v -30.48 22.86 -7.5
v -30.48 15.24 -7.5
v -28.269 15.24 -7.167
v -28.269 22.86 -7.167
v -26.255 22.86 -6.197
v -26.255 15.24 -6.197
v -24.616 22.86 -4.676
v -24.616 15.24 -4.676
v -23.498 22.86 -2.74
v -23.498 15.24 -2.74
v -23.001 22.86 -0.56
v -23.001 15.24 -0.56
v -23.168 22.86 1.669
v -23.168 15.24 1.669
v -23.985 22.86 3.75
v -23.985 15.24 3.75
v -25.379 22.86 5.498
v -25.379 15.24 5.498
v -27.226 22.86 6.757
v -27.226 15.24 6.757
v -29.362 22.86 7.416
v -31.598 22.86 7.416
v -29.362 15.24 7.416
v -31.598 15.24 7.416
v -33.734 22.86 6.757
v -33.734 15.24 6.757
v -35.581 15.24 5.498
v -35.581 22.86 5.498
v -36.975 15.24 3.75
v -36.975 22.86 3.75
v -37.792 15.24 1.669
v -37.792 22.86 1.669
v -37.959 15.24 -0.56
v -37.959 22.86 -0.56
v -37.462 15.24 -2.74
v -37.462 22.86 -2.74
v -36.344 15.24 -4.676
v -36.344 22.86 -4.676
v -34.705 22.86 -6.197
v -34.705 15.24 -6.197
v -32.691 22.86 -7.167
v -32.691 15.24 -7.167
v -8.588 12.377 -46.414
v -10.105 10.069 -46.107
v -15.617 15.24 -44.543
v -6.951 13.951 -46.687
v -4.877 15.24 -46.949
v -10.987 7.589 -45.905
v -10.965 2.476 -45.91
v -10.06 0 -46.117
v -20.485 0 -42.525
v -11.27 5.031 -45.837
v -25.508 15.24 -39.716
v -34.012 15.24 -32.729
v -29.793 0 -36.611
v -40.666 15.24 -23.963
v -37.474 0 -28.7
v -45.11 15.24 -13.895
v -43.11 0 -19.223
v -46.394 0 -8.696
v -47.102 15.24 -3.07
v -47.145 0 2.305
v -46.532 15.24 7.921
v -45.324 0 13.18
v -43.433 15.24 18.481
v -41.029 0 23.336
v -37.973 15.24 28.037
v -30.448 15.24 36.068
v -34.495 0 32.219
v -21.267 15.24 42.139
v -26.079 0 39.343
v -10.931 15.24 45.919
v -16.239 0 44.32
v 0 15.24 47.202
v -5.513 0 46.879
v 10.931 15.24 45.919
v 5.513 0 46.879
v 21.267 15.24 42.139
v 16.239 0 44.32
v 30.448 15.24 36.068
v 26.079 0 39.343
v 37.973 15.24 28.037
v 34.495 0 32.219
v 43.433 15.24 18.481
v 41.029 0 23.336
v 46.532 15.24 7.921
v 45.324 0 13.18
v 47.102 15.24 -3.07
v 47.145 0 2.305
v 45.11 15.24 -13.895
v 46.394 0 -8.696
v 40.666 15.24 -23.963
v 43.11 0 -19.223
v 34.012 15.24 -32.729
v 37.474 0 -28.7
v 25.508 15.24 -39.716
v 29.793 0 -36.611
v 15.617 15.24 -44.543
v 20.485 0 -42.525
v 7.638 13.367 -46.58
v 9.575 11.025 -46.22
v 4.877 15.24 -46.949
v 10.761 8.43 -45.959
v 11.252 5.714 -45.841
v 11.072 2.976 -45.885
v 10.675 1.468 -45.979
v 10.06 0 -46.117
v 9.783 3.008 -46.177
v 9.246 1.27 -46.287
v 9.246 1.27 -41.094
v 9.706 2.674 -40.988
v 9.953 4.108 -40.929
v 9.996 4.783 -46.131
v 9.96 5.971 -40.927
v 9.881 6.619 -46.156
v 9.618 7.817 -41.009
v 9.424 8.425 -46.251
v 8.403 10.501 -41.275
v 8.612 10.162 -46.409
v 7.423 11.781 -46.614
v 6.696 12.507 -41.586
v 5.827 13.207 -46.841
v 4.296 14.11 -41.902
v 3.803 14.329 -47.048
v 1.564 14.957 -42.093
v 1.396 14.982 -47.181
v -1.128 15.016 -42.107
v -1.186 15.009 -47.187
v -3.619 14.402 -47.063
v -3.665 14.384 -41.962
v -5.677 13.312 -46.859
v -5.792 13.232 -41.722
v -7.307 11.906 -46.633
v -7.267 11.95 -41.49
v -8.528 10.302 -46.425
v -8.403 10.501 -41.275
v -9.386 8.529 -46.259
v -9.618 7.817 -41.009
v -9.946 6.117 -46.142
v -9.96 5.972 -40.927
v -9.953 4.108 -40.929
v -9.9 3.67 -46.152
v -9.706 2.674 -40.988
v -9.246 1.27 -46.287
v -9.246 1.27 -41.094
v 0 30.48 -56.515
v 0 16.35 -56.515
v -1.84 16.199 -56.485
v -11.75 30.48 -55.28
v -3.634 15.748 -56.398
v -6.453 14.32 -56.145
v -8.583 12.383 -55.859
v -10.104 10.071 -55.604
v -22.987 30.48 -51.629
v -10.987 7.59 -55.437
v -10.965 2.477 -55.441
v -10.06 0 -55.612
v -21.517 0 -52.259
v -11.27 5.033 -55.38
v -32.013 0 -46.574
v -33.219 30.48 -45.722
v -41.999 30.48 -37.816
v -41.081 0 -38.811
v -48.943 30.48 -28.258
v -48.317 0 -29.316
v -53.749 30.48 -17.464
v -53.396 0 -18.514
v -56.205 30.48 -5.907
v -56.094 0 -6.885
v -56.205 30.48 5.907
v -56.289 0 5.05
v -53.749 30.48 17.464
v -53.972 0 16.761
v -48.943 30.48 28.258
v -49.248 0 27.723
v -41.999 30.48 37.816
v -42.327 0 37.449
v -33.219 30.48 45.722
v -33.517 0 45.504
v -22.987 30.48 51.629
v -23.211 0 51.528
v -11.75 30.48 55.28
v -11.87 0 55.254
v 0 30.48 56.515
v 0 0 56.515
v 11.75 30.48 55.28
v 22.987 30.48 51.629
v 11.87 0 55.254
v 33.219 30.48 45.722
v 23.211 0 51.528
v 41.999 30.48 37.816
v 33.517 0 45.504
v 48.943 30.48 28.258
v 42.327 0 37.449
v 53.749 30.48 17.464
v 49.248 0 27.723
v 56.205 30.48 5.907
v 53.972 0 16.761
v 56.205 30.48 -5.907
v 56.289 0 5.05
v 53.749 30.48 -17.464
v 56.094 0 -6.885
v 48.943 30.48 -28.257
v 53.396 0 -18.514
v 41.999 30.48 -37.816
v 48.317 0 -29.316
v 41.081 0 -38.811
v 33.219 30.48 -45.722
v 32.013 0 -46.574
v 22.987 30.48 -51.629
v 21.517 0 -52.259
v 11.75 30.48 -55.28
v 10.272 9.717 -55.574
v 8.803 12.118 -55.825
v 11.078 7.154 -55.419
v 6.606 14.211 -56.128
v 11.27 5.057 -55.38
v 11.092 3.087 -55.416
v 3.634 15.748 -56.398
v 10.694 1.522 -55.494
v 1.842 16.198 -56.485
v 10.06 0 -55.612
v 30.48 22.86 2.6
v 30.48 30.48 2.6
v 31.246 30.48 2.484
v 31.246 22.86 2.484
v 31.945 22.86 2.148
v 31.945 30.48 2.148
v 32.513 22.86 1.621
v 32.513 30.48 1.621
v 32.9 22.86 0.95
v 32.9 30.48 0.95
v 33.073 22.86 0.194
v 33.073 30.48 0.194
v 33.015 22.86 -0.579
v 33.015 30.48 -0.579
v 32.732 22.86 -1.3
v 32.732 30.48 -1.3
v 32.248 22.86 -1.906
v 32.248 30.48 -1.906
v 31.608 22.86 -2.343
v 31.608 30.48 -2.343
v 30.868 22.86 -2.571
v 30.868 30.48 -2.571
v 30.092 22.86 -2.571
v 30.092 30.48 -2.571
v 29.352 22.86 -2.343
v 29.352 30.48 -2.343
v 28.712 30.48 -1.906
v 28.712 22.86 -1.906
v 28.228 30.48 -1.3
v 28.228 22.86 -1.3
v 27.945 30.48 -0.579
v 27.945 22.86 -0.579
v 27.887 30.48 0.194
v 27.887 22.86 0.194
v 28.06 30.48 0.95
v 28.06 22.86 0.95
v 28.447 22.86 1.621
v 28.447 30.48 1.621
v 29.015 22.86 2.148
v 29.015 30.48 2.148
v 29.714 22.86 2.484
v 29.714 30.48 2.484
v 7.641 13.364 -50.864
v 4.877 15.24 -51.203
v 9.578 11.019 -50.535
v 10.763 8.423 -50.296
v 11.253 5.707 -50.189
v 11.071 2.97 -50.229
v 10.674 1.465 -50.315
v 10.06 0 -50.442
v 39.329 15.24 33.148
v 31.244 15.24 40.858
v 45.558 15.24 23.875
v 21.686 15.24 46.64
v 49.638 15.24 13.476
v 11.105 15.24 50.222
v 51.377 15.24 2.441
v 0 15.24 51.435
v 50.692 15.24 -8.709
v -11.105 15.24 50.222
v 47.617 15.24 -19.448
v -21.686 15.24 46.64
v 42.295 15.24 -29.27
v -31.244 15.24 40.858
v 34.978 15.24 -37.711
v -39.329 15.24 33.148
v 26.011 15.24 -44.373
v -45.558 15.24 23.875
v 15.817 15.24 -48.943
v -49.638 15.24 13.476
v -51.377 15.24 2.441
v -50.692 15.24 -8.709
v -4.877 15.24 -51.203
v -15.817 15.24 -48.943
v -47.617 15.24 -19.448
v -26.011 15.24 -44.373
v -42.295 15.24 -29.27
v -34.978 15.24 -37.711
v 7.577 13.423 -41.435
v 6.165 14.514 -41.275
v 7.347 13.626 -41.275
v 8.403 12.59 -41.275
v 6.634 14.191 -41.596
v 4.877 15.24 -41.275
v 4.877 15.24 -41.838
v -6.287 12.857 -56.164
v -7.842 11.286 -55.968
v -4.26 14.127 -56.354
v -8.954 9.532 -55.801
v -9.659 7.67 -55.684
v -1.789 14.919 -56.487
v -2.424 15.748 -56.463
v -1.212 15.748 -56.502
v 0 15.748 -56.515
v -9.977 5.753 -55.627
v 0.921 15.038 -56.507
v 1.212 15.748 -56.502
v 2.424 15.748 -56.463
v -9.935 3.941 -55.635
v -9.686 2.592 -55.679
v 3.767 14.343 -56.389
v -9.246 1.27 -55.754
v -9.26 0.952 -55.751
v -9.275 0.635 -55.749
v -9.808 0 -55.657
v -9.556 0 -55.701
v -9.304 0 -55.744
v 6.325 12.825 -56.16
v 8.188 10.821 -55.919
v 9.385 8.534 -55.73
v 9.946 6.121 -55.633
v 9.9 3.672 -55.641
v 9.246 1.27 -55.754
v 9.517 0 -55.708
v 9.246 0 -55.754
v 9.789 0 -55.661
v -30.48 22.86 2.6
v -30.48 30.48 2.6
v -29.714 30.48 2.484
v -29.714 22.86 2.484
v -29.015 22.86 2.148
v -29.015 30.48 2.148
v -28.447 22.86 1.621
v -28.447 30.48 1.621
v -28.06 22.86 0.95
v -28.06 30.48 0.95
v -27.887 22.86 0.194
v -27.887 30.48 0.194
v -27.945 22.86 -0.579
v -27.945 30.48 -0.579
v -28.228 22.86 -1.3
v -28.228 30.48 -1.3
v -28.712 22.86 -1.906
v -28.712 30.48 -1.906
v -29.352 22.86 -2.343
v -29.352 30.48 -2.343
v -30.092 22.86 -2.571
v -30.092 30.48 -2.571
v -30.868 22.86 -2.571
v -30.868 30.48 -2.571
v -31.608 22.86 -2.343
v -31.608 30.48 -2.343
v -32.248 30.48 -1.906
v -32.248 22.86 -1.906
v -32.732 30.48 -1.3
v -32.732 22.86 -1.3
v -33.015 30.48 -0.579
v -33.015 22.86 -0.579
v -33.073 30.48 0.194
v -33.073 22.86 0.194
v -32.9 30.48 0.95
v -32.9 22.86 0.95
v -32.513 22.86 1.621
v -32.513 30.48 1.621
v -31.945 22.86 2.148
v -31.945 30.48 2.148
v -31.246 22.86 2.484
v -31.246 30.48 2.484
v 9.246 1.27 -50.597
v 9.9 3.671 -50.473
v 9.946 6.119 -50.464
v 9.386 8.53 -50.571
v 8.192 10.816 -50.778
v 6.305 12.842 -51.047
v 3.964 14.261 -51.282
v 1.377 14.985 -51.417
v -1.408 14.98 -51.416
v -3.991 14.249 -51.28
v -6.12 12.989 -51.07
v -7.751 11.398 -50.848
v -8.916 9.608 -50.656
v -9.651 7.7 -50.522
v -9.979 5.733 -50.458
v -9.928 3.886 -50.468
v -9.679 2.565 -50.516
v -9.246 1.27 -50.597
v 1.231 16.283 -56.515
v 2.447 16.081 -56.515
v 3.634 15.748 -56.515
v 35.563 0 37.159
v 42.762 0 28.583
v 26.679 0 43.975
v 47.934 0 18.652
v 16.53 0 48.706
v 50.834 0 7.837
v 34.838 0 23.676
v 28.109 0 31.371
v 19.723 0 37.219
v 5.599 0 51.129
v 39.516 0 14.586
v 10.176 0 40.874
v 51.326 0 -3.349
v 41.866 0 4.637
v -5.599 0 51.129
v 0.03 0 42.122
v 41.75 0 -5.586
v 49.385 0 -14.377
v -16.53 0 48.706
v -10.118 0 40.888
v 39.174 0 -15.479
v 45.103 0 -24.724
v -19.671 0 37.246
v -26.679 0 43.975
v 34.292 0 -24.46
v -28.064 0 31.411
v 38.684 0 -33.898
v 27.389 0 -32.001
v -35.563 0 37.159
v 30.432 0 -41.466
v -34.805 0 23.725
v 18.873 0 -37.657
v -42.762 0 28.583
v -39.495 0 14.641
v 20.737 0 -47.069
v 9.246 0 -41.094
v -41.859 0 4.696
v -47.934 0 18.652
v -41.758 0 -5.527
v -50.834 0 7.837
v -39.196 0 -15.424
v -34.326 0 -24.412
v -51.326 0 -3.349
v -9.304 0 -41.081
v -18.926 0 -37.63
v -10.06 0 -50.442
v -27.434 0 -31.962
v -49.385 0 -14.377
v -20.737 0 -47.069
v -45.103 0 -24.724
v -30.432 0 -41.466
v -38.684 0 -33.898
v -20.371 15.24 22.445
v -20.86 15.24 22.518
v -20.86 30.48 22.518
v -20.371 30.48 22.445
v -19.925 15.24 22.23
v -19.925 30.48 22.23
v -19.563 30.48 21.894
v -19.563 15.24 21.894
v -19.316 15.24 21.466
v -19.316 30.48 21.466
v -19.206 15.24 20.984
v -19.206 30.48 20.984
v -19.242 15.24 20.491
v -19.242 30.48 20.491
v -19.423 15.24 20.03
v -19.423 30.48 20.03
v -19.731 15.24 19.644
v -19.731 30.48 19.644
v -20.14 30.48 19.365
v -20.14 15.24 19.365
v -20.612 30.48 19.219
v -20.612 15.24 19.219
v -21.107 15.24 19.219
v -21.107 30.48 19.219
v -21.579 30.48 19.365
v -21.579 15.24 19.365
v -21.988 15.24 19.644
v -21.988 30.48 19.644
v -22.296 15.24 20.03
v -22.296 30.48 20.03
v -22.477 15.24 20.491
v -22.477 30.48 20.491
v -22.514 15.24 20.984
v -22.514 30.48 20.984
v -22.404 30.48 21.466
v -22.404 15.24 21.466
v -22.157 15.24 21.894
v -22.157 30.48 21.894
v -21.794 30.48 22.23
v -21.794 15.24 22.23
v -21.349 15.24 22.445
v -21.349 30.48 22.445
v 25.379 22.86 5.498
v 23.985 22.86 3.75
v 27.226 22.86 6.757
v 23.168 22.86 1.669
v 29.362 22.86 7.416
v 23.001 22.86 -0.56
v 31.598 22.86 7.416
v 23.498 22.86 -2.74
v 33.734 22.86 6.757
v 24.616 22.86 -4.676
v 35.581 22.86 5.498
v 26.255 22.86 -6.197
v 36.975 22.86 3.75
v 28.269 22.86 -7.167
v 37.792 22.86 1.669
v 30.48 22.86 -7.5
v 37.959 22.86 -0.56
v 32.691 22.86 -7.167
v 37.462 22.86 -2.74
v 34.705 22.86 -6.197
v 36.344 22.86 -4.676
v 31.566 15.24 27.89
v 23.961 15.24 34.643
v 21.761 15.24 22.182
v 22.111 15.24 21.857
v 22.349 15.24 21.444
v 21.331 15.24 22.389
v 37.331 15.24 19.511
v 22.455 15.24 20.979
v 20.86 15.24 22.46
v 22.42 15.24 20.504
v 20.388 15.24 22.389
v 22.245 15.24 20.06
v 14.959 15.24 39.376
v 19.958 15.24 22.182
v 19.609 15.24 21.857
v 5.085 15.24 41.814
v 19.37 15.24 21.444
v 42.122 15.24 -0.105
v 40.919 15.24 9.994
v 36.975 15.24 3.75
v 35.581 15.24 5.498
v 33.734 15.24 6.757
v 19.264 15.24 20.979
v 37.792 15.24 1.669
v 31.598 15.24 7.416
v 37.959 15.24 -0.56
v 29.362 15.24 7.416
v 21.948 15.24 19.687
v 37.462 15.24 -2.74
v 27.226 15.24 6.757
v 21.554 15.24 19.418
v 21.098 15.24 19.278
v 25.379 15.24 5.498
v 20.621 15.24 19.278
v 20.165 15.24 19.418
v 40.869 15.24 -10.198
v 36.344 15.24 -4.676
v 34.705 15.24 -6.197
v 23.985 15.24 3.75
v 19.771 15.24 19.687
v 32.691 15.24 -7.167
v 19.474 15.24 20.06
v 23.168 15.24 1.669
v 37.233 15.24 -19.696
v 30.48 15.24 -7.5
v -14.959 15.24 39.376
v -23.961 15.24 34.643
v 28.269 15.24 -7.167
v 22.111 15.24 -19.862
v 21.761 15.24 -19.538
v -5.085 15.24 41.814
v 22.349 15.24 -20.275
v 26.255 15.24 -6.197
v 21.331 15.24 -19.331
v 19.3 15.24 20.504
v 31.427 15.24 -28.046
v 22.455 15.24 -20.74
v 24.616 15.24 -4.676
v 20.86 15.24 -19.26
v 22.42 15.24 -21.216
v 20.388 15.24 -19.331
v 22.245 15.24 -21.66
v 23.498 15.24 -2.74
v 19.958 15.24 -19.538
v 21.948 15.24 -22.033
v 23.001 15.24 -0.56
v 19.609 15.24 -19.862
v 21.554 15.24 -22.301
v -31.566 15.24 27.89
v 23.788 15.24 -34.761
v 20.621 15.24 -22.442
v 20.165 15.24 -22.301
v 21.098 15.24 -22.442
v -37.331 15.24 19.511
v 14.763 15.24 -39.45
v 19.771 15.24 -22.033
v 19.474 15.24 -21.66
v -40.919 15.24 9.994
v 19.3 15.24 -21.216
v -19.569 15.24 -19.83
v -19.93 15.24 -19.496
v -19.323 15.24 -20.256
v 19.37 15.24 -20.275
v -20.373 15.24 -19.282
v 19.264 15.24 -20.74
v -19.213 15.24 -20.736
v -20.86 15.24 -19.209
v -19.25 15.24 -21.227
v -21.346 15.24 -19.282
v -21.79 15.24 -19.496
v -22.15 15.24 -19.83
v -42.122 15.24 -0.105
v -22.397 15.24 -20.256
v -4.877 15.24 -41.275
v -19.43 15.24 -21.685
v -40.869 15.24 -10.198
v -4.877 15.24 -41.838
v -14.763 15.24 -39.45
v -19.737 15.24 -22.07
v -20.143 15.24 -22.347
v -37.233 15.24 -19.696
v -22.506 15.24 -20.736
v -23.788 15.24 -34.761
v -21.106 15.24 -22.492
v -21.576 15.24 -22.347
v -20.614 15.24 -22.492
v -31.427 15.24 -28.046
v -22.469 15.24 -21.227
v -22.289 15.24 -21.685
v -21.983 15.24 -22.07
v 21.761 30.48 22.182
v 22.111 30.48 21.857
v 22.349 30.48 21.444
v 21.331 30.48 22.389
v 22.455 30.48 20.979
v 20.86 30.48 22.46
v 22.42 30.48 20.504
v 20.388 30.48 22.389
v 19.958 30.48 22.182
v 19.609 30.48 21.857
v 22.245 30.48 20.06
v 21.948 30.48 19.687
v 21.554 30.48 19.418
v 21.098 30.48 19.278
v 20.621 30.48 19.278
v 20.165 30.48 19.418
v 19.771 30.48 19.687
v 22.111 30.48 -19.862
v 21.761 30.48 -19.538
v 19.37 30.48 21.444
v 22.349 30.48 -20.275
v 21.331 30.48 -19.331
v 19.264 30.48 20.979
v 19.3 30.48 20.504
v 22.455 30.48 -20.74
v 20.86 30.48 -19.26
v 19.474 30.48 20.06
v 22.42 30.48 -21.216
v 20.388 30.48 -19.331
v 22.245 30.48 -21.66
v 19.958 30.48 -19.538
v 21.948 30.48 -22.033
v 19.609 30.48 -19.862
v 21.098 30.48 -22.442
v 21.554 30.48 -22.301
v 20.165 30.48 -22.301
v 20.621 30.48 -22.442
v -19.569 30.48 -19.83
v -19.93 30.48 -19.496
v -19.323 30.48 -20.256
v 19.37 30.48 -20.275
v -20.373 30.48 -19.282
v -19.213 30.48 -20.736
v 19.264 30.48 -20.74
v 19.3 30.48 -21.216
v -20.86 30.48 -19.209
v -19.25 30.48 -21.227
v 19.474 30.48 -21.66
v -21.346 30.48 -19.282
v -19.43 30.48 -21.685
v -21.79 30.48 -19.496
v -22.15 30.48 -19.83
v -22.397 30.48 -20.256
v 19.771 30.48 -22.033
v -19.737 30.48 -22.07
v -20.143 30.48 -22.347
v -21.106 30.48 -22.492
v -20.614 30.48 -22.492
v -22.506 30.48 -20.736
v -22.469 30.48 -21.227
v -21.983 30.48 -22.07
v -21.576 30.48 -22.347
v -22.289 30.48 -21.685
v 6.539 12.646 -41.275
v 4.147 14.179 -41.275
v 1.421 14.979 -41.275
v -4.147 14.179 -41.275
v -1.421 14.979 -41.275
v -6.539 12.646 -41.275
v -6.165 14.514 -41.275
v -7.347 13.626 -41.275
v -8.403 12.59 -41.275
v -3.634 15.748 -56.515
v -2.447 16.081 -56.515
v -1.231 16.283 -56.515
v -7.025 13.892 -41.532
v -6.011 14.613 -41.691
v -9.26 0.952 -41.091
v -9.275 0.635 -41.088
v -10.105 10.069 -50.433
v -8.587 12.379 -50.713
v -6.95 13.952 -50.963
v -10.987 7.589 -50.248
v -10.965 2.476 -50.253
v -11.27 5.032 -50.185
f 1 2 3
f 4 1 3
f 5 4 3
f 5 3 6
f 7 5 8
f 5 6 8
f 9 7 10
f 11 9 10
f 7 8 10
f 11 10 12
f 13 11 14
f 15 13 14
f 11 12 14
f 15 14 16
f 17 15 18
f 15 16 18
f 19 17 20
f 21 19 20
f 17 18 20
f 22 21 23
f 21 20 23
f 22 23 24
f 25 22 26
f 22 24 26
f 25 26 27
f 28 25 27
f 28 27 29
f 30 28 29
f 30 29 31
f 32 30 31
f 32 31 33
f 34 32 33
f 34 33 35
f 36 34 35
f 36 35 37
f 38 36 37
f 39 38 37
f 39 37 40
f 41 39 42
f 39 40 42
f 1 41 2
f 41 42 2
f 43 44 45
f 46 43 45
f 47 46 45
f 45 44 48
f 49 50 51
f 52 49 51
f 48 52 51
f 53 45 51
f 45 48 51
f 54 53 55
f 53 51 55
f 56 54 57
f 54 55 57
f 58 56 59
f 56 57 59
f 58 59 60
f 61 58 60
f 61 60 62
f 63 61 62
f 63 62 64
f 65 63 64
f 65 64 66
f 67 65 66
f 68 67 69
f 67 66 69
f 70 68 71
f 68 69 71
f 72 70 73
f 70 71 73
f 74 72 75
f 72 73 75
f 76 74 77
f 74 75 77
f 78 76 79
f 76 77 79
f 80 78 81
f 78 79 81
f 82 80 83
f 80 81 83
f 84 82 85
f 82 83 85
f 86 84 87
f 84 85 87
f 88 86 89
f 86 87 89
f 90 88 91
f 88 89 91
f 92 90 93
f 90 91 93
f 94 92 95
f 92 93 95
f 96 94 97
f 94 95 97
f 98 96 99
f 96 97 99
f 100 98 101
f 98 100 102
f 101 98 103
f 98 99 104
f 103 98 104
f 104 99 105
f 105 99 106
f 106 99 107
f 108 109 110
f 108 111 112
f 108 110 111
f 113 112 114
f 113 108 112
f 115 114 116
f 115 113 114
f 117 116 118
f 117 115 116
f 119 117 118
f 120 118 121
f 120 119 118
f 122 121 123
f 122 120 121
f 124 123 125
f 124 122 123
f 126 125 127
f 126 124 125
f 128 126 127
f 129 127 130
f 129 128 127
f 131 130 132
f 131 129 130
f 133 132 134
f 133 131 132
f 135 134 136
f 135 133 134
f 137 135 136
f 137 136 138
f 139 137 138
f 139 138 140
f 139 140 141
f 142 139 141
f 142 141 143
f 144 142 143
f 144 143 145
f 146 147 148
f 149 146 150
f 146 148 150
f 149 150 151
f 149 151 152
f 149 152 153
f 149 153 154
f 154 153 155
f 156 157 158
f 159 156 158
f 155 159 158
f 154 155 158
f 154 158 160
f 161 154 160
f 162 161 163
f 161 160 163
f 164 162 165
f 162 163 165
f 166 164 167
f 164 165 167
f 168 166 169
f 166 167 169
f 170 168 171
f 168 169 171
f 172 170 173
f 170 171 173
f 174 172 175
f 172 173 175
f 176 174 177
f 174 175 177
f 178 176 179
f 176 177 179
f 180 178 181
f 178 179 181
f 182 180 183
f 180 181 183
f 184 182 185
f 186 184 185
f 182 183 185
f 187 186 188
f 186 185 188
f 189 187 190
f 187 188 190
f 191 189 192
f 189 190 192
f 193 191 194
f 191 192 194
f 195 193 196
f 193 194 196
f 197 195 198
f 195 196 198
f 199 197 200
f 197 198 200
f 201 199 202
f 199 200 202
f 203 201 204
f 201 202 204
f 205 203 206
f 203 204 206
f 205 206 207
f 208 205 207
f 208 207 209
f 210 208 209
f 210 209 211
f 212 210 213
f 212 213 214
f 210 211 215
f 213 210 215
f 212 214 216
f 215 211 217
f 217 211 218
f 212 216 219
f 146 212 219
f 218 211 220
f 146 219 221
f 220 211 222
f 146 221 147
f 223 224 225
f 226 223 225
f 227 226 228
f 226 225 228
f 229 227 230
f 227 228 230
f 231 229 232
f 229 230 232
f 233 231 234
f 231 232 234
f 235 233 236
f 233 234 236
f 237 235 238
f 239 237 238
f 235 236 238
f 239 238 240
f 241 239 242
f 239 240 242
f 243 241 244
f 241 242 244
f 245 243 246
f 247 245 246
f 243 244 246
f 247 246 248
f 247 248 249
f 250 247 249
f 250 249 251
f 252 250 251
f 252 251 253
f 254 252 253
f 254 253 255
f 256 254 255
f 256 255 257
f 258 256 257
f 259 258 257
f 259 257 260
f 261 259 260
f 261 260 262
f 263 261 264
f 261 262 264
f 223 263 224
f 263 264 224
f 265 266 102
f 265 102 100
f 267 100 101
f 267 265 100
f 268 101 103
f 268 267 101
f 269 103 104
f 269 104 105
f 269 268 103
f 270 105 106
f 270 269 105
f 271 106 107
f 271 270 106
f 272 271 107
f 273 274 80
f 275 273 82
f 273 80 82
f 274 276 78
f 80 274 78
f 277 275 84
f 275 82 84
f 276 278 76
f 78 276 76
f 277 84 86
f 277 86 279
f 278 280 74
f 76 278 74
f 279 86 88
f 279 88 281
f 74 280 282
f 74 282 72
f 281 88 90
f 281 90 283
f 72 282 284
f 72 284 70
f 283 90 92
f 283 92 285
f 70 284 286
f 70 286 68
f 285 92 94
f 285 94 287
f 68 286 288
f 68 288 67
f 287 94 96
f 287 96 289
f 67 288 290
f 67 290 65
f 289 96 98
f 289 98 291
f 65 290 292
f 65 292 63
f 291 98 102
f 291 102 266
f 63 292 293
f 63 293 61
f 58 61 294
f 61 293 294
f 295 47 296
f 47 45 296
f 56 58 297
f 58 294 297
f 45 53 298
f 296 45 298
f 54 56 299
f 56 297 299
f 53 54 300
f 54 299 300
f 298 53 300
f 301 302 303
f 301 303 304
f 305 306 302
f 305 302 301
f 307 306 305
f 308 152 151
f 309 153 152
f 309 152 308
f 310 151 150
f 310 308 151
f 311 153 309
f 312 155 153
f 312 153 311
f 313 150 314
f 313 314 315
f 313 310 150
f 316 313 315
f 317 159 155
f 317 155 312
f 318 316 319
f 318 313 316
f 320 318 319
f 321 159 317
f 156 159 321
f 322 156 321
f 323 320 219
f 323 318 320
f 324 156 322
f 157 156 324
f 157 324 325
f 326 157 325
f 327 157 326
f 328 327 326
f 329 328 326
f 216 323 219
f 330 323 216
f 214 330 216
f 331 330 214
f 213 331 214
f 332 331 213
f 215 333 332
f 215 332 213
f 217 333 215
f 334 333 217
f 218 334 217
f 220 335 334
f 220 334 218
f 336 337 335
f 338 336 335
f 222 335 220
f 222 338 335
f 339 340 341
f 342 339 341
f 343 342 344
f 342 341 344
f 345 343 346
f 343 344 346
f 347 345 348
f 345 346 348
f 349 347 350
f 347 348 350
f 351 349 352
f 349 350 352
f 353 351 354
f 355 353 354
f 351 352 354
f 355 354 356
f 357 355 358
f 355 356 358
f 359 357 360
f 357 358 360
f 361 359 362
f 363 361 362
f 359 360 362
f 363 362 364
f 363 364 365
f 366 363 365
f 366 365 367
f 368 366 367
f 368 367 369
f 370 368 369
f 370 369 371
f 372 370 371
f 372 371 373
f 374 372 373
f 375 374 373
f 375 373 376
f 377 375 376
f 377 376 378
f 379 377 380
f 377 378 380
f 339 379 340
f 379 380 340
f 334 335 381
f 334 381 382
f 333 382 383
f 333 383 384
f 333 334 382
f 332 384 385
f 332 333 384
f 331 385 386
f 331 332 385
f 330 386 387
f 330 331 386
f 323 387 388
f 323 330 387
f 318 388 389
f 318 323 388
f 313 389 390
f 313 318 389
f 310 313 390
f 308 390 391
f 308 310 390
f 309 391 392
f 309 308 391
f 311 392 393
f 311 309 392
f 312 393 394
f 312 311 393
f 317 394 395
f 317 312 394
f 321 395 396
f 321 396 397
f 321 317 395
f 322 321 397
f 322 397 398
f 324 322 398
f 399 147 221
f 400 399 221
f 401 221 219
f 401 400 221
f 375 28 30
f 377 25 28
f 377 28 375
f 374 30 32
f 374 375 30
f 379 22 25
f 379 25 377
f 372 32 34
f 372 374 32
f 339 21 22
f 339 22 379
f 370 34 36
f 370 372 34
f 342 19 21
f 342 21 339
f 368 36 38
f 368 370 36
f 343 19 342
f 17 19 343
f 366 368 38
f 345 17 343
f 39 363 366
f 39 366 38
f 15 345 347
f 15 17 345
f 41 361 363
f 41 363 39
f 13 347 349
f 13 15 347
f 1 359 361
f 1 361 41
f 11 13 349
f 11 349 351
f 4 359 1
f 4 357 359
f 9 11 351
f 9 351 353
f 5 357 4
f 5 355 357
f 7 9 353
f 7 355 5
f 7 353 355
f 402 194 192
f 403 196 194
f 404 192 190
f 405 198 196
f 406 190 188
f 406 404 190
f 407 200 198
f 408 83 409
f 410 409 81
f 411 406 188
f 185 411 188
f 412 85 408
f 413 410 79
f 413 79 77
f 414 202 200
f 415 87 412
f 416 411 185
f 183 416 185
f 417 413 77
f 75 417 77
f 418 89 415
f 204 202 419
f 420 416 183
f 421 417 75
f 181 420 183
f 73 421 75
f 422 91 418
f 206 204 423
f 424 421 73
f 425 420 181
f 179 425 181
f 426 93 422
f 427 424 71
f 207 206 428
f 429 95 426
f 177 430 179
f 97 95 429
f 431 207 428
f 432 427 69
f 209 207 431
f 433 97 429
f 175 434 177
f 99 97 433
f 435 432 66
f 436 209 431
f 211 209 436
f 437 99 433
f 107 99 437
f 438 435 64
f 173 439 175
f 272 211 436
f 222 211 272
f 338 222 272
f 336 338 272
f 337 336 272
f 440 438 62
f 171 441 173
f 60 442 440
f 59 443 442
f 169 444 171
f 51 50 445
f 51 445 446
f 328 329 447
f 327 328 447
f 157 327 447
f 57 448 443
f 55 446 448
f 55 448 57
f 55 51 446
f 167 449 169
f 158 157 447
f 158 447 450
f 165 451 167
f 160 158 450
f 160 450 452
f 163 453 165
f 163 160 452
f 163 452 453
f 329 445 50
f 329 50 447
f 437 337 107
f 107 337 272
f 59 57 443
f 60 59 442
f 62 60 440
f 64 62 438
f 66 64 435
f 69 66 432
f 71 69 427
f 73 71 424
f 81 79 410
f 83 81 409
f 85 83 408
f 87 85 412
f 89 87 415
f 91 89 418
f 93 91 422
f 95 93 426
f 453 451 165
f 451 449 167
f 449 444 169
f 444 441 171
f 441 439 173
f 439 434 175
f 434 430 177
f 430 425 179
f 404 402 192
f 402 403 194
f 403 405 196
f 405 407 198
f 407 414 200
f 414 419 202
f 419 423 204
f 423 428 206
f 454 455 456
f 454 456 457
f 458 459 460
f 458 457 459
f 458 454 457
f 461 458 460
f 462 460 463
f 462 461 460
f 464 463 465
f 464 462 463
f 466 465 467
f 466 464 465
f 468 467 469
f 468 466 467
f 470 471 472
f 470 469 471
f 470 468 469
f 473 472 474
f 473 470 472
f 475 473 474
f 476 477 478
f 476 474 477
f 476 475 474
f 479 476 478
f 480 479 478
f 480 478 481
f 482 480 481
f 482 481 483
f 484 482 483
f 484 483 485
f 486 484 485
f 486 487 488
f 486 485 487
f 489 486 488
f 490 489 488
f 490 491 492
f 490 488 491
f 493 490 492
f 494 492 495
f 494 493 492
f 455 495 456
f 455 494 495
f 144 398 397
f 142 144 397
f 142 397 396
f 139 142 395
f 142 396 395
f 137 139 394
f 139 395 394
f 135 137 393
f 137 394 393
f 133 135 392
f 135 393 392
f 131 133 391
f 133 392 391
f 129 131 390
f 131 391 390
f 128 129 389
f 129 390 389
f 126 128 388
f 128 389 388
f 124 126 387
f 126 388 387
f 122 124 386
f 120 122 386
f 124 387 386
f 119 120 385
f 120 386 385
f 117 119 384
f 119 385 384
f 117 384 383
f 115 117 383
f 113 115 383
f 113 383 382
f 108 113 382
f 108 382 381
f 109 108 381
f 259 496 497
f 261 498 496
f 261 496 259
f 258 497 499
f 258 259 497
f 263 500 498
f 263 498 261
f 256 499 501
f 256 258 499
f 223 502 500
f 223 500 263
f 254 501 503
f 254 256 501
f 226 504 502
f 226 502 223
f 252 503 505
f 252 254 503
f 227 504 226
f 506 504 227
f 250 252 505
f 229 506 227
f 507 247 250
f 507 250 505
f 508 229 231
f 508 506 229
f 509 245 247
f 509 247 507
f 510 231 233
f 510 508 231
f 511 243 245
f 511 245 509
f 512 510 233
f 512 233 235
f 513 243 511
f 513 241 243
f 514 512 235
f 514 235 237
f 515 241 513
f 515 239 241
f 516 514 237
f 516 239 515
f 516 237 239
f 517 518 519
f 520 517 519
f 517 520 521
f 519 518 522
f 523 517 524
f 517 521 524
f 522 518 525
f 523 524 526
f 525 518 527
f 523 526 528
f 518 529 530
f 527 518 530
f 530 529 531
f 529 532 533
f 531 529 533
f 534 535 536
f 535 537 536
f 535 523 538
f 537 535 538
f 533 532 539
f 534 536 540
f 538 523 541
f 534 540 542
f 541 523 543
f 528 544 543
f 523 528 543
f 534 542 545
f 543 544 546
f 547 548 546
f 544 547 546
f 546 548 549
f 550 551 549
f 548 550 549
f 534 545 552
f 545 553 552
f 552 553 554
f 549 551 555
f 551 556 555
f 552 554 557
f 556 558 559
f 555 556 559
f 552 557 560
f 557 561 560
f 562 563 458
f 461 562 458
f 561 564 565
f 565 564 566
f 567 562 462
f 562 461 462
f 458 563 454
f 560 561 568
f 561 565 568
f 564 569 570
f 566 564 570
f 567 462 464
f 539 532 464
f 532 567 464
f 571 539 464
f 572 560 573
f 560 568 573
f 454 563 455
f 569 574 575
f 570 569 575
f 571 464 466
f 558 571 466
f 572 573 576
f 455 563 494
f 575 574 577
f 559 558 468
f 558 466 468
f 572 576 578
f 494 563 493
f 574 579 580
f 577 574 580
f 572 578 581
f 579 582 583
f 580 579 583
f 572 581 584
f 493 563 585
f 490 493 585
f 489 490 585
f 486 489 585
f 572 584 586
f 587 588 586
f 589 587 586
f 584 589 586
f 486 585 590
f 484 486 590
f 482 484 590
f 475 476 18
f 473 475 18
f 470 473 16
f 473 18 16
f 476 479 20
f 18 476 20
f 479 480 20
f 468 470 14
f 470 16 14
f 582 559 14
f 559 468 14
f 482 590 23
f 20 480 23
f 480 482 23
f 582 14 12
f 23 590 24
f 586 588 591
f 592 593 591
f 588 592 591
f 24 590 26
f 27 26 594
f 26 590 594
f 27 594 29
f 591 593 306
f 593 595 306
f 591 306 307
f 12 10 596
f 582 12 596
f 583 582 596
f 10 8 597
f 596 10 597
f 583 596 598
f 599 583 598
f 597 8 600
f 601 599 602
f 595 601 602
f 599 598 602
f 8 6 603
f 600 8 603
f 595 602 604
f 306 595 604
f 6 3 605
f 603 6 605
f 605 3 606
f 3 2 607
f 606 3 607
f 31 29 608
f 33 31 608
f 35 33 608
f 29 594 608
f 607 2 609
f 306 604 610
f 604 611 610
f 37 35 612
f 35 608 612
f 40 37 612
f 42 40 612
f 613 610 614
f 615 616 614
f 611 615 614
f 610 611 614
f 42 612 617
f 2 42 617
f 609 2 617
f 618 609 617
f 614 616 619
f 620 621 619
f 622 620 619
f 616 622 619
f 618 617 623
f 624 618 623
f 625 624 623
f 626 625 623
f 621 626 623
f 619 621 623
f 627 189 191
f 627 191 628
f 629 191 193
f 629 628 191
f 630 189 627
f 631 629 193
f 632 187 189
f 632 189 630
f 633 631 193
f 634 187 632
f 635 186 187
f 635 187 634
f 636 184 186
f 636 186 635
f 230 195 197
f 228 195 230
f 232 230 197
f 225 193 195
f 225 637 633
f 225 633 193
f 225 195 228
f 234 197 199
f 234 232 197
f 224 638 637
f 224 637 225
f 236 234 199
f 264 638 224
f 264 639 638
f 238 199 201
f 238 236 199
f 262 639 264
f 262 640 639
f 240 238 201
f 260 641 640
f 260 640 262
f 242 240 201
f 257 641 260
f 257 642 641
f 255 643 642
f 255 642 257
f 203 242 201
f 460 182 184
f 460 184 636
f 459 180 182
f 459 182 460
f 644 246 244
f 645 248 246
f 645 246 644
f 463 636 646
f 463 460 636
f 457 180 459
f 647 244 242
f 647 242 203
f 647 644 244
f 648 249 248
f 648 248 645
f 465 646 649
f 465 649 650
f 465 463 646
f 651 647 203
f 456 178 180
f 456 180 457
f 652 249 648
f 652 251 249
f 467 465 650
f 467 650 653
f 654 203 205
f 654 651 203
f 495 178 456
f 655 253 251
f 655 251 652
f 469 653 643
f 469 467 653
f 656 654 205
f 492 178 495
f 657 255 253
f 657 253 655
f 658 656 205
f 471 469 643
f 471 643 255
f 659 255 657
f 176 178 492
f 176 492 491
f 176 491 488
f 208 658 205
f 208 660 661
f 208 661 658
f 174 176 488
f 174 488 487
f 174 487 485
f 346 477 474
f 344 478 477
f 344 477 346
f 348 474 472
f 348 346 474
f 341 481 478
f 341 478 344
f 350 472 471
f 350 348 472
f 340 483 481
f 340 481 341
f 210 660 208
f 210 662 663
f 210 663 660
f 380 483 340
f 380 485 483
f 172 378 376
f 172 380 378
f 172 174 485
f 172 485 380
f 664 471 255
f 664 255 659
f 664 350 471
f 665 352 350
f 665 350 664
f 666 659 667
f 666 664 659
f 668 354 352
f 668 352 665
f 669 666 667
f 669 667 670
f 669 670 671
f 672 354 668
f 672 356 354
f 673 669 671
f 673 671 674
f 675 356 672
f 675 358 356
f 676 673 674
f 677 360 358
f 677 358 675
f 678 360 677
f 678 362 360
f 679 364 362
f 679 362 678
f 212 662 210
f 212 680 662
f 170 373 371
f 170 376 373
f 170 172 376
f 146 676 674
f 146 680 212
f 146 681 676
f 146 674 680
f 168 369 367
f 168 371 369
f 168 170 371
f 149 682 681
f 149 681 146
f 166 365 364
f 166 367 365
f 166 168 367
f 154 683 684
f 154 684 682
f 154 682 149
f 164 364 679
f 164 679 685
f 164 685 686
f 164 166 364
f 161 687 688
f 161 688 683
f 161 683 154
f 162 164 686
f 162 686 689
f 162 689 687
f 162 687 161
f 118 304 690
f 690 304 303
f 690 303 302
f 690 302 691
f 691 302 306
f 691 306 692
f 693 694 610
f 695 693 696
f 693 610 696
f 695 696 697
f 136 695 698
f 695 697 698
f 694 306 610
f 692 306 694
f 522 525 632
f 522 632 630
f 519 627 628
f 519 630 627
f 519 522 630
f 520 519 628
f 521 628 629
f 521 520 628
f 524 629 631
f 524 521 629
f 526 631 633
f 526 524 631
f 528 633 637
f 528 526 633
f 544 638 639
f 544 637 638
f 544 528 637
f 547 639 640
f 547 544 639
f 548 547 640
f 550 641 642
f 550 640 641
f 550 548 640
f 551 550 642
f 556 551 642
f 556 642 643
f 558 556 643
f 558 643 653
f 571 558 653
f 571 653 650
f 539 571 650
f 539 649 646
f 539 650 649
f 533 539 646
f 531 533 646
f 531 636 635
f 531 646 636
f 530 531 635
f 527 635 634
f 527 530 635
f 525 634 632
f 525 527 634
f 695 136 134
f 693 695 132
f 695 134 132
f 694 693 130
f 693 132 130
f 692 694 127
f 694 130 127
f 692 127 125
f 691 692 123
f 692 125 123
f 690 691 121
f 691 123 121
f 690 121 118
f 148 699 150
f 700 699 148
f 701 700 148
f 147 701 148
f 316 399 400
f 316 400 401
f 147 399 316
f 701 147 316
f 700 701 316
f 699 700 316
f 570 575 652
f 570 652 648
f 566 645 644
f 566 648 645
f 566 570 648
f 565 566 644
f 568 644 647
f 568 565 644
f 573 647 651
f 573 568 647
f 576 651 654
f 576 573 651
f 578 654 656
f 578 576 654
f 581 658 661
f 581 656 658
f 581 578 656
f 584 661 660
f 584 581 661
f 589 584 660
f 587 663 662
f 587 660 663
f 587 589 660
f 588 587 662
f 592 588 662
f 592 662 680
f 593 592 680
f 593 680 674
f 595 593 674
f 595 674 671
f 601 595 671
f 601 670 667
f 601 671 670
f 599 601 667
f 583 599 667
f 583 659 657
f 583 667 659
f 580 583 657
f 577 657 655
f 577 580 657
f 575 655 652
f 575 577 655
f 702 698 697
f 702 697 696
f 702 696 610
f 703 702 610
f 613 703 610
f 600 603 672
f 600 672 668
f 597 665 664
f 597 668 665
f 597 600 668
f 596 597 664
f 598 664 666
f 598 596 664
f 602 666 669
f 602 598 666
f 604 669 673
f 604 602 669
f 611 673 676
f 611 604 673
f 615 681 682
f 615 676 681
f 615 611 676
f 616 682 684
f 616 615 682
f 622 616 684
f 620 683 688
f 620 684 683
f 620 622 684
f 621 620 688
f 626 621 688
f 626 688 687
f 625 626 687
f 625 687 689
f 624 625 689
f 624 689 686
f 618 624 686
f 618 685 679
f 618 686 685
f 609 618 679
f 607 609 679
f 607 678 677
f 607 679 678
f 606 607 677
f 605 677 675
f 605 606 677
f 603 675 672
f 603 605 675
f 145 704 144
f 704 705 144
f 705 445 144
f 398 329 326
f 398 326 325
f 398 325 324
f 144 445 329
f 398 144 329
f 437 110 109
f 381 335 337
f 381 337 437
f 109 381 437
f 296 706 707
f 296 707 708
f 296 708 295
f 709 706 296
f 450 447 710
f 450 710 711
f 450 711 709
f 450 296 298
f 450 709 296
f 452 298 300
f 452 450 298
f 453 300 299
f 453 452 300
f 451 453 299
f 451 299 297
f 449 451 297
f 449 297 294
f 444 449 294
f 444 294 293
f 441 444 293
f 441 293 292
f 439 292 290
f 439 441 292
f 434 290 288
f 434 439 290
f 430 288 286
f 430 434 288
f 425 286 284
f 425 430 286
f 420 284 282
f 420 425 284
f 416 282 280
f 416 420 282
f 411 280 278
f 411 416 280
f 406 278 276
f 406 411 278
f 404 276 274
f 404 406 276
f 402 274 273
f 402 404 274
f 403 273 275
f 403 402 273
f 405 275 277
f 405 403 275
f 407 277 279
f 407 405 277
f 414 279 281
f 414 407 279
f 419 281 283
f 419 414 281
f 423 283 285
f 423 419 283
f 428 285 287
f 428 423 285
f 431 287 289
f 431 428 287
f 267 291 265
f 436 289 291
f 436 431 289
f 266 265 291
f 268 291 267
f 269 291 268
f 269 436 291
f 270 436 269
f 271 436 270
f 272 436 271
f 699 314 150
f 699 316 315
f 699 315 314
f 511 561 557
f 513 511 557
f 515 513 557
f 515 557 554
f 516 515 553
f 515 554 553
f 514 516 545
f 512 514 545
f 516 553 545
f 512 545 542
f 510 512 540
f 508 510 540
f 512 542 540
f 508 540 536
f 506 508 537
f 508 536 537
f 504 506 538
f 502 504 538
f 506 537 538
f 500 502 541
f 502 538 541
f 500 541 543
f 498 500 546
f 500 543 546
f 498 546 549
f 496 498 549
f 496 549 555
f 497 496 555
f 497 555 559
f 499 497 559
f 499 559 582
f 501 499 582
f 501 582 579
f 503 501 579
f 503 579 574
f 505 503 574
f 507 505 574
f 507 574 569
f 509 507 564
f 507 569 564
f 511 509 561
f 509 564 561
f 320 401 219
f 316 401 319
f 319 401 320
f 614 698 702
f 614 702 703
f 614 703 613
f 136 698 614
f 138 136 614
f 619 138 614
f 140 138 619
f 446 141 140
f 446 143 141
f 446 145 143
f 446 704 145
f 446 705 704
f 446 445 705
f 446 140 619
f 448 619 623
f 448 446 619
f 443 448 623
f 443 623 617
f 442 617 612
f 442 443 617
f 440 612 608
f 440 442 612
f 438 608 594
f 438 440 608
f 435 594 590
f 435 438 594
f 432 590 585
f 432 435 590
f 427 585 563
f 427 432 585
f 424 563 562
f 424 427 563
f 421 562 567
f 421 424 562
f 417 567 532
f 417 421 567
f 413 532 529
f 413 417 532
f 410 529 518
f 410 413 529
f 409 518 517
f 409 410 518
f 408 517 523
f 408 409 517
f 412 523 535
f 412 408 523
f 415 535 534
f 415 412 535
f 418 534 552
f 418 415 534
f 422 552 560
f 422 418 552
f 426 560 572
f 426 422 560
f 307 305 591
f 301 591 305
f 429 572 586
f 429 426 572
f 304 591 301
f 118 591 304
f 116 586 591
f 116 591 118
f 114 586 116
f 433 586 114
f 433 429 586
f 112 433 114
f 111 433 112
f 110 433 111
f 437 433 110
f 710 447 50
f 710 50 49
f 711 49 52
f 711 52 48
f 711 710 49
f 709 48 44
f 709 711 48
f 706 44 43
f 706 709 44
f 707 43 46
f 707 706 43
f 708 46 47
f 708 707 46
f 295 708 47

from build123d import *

# Parameters (mm, degrees)
SKETCH2_R               = 56.515
SKETCH2_R_2             = 51.435
BOSS_EXTRUDE1_DEPTH     = 15.24
SKETCH2_R_3             = 47.201666667
SKETCH2_R_4             = 42.121666667
BOSS_EXTRUDE1_2_DEPTH   = 15.24
SKETCH3_R               = 56.515
BOSS_EXTRUDE2_DEPTH     = 15.24
CUT_EXTRUDE1_DEPTH      = 86.539001923
CUT_EXTRUDE1_DEPTH_BACK = 86.539001923
SKETCH4_R               = 1.6
SKETCH4_R_2             = 1.65876763
SKETCH4_R_3             = 1.651
SKETCH14_R              = 10
CUT_EXTRUDE7_DEPTH      = 19.558
SKETCH16_W              = 1.27
SKETCH16_H              = 1.27
EXTRUDE_THIN1_DEPTH     = 15.24
SKETCH20_R              = 66.675
SKETCH20_R_2            = 56.515
CUT_EXTRUDE_THIN3_DEPTH = 15.748
CUT_EXTRUDE12_DEPTH     = 15.748
SKETCH24_R              = 2.6
CUT_EXTRUDE15_DEPTH     = 7.62
SKETCH25_R              = 7.5
CUT_EXTRUDE16_DEPTH     = 7.62


with BuildPart() as part:
    # Sketch2 → Boss-Extrude1 (new body)
    with BuildSketch(Plane(origin=(0, 0, 0), x_dir=(1, 0, 0), z_dir=(0, 1, 0))):
        with Locations(Location((0, 0, 0), (0, 0, 90))):
            Circle(SKETCH2_R)
        with Locations(Location((0, 0, 0), (0, 0, 90))):
            Circle(SKETCH2_R_2, mode=Mode.SUBTRACT)
    extrude(amount=BOSS_EXTRUDE1_DEPTH)



with BuildPart() as body_2:
    # Sketch2 → Boss-Extrude1 2 (new body)
    with BuildSketch(Plane(origin=(0, 0, 0), x_dir=(1, 0, 0), z_dir=(0, 1, 0))):
        with Locations(Location((0, 0, 0), (0, 0, 90))):
            Circle(SKETCH2_R_3)
        with Locations(Location((0, 0, 0), (0, 0, 90))):
            Circle(SKETCH2_R_4, mode=Mode.SUBTRACT)
    extrude(amount=BOSS_EXTRUDE1_2_DEPTH)


with BuildPart() as part_1:
    add(part.part)

    add(body_2.part)  # Boss-Extrude2 merges body 2
    # Sketch3 → Boss-Extrude2 (add)
    with BuildSketch(Plane(origin=(0, 15.24, 0), x_dir=(1, 0, 0), z_dir=(0, 1, 0))):
        with Locations(Location((0, 0, 0), (0, 0, 90))):
            Circle(SKETCH3_R)
    extrude(amount=BOSS_EXTRUDE2_DEPTH)

    # Sketch4 → Cut-Extrude1 (cut, two sides: drawn at the far end of the back side and taken through both)
    with BuildSketch(Plane(origin=(0, 30.48, 0), x_dir=(1, 0, 0), z_dir=(0, 1, 0)).offset(-CUT_EXTRUDE1_DEPTH_BACK)):
        with Locations(Location((20.859650045, 20.859650045, 0), (0, 0, 270))):
            Circle(SKETCH4_R)
        with Locations(Location((20.859650045, -20.859650045, 0), (0, 0, 270))):
            Circle(SKETCH4_R)
        with Locations(Location((-20.859650045, -20.859650045, 0), (0, 0, 270))):
            Circle(SKETCH4_R_2)
        with Locations(Location((-20.859650045, 20.859650045, 0), (0, 0, 270))):
            Circle(SKETCH4_R_3)
    extrude(amount=CUT_EXTRUDE1_DEPTH + CUT_EXTRUDE1_DEPTH_BACK, mode=Mode.SUBTRACT)

    # Sketch14 → Cut-Extrude7 (cut)
    with BuildSketch(Plane.XY.offset(-56.515)):
        with Locations((0, 5.08)):
            Circle(SKETCH14_R)
    extrude(amount=CUT_EXTRUDE7_DEPTH, mode=Mode.SUBTRACT)

    # Sketch16 → Extrude-Thin1 (add)
    # profile 1 of 2: a face of its own
    with BuildSketch(Plane.XY.offset(-56.515)):
        with Locations((-0.635, 0.635)):
            Rectangle(SKETCH16_W, SKETCH16_H)
    # profile 2 of 2: a face of its own
    with BuildSketch(Plane.XY.offset(-56.515)):
        with BuildLine():
            Line((10.060144134, 0), (-10.060144134, 0))
            ThreePointArc((-10.060144134, 0), (0, 16.35), (10.060144134, 0))
        make_face()
        with BuildLine():
            Line((9.245750375, 1.27), (-9.245750375, 1.27))
            ThreePointArc((-9.245750375, 1.27), (0, 15.08), (9.245750375, 1.27))
        make_face(mode=Mode.SUBTRACT)
    extrude(amount=EXTRUDE_THIN1_DEPTH)

    # Sketch20 → Cut-Extrude-Thin3 (cut)
    with BuildSketch(Plane(origin=(0, 0, 0), x_dir=(-1, 0, 0), z_dir=(0, -1, 0))):
        Circle(SKETCH20_R)
        Circle(SKETCH20_R_2, mode=Mode.SUBTRACT)
    extrude(amount=-CUT_EXTRUDE_THIN3_DEPTH, mode=Mode.SUBTRACT)

    # Sketch21 → Cut-Extrude12 (cut)
    with BuildSketch(Plane.XY.offset(-56.515)):
        Polygon((-9.303733138, 0), (-9.245750375, 1.27), (9.245750375, 1.27), (9.245750375, 0), align=None)
    extrude(amount=CUT_EXTRUDE12_DEPTH, mode=Mode.SUBTRACT)

    # Sketch24 → Cut-Extrude15 (cut)
    with BuildSketch(Plane(origin=(0, 30.48, 0), x_dir=(1, 0, 0), z_dir=(0, 1, 0))):
        with Locations(Location((30.48, 0, 0), (0, 0, 270))):
            Circle(SKETCH24_R)
        with Locations(Location((-30.48, 0, 0), (0, 0, 270))):
            Circle(SKETCH24_R)
    extrude(amount=-CUT_EXTRUDE15_DEPTH, mode=Mode.SUBTRACT)

    # Sketch25 → Cut-Extrude16 (cut)
    with BuildSketch(Plane(origin=(0, 15.24, 0), x_dir=(-1, 0, 0), z_dir=(0, -1, 0))):
        with Locations(Location((30.48, 0, 0), (0, 0, 90))):
            Circle(SKETCH25_R)
        with Locations(Location((-30.48, 0, 0), (0, 0, 90))):
            Circle(SKETCH25_R)
    extrude(amount=-CUT_EXTRUDE16_DEPTH, mode=Mode.SUBTRACT)


solid = part_1.part
